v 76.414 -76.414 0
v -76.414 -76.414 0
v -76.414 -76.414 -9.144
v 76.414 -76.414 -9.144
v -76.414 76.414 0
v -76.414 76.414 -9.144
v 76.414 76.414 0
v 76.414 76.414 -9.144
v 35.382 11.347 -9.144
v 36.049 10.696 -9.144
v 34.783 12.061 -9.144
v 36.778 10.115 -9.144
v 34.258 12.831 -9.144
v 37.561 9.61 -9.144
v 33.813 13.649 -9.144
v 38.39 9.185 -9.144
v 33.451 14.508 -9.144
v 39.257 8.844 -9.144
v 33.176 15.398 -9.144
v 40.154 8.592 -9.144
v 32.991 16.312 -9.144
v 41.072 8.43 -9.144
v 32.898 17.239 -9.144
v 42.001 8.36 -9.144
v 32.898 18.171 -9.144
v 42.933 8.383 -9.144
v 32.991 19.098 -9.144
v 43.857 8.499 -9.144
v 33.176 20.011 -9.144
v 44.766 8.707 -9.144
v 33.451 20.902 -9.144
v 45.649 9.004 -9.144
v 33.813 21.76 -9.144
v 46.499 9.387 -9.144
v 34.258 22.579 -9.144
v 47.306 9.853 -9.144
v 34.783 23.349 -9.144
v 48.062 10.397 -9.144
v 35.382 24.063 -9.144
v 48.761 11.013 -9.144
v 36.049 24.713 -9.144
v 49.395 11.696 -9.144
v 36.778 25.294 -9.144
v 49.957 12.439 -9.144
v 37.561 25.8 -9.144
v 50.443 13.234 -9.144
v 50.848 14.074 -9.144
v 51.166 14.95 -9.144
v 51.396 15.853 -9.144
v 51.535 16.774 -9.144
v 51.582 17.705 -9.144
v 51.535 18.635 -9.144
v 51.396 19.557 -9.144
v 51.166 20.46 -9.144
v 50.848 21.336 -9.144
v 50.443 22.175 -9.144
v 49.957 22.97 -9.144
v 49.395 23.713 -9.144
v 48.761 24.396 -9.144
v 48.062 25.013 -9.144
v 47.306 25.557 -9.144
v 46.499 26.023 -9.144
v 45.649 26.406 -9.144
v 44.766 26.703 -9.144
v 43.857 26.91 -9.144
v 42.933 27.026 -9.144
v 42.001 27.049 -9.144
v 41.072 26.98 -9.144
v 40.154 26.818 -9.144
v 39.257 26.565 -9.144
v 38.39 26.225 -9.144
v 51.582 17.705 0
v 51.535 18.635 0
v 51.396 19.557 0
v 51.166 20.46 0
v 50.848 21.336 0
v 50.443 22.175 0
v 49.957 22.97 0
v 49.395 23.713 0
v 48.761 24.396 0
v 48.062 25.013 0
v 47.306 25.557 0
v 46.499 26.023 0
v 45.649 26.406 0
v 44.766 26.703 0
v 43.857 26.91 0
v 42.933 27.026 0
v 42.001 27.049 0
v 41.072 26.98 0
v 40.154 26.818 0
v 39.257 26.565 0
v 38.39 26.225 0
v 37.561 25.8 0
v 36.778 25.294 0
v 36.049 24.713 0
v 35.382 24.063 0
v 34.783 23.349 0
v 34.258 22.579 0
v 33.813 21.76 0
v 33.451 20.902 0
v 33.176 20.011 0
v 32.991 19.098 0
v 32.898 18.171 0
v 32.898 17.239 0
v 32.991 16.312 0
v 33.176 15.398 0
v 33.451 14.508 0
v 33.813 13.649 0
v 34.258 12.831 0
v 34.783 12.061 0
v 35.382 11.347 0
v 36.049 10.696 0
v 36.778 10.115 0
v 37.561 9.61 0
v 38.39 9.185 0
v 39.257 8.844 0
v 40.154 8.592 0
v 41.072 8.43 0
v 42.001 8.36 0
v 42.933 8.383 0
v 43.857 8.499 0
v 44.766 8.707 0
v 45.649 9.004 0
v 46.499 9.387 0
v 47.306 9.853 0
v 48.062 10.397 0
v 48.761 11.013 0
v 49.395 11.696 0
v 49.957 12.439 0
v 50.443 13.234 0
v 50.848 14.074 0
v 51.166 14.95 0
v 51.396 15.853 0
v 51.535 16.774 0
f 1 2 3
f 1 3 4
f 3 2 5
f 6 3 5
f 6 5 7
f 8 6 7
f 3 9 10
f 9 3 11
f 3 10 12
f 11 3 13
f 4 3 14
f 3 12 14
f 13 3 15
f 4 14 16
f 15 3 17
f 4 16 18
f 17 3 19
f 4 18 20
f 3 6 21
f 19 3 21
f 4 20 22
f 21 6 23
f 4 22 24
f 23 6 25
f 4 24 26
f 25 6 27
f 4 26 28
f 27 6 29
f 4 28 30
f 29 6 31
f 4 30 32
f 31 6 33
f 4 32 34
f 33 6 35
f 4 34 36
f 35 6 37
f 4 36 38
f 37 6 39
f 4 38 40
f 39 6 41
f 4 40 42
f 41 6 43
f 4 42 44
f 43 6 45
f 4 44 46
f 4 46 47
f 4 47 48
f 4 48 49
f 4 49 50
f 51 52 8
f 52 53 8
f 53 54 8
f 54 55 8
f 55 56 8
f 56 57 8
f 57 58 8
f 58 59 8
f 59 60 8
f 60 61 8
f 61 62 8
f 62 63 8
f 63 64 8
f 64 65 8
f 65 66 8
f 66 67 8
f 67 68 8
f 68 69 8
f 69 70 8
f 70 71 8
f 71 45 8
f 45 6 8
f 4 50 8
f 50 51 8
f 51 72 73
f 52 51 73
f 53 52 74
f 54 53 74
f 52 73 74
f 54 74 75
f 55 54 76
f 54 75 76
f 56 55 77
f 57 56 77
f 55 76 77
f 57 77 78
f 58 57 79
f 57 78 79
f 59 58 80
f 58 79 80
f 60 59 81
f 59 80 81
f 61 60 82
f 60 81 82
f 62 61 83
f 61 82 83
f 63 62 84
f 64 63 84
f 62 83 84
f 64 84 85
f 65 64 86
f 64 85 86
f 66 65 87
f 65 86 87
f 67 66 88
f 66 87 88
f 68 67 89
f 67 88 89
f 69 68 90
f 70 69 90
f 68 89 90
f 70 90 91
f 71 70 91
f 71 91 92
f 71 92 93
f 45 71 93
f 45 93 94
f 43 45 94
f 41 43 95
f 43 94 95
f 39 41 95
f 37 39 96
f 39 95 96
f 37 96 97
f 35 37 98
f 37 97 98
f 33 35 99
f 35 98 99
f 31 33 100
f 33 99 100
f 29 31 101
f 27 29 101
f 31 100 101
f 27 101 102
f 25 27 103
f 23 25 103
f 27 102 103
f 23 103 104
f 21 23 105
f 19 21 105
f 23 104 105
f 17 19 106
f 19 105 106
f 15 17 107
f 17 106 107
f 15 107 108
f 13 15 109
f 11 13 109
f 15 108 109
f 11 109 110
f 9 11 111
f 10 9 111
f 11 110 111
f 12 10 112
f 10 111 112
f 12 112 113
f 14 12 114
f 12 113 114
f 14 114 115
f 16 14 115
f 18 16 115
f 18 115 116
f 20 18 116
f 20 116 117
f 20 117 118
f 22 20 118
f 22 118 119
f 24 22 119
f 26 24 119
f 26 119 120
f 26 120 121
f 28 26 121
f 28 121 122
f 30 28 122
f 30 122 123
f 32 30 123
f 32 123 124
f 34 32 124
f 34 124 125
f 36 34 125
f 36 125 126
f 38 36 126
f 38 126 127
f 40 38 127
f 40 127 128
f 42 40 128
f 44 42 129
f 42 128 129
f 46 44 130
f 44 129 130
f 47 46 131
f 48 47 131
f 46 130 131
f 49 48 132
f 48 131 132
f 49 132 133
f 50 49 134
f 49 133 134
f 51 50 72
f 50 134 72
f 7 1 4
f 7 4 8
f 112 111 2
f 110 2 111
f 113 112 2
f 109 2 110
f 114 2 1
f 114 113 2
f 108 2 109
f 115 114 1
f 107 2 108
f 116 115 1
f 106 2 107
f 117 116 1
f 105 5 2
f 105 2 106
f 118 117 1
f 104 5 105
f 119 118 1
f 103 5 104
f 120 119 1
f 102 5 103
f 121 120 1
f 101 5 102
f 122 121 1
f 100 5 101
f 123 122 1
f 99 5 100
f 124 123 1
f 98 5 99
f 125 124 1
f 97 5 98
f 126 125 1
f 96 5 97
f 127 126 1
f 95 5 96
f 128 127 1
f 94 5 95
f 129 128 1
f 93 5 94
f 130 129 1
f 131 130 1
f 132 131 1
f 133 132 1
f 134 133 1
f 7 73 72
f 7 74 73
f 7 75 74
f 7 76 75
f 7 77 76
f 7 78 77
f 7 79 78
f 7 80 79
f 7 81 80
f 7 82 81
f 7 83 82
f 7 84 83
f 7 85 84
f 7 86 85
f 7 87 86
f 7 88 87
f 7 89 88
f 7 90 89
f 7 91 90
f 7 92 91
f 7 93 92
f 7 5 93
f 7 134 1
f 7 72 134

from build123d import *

# Parameters (mm, degrees)
SKETCH1_W      = 152.828642472
SKETCH1_H      = 152.828642472
SKETCH1_R      = 9.347426307
EXTRUDE1_DEPTH = 9.144


with BuildPart() as part:
    # Sketch1 → Extrude1 (new body)
    with BuildSketch(Plane.XY):
        Rectangle(SKETCH1_W, SKETCH1_H)
        with Locations((42.234252899, 17.704783599)):
            Circle(SKETCH1_R, mode=Mode.SUBTRACT)
    extrude(amount=-EXTRUDE1_DEPTH)


solid = part.part
